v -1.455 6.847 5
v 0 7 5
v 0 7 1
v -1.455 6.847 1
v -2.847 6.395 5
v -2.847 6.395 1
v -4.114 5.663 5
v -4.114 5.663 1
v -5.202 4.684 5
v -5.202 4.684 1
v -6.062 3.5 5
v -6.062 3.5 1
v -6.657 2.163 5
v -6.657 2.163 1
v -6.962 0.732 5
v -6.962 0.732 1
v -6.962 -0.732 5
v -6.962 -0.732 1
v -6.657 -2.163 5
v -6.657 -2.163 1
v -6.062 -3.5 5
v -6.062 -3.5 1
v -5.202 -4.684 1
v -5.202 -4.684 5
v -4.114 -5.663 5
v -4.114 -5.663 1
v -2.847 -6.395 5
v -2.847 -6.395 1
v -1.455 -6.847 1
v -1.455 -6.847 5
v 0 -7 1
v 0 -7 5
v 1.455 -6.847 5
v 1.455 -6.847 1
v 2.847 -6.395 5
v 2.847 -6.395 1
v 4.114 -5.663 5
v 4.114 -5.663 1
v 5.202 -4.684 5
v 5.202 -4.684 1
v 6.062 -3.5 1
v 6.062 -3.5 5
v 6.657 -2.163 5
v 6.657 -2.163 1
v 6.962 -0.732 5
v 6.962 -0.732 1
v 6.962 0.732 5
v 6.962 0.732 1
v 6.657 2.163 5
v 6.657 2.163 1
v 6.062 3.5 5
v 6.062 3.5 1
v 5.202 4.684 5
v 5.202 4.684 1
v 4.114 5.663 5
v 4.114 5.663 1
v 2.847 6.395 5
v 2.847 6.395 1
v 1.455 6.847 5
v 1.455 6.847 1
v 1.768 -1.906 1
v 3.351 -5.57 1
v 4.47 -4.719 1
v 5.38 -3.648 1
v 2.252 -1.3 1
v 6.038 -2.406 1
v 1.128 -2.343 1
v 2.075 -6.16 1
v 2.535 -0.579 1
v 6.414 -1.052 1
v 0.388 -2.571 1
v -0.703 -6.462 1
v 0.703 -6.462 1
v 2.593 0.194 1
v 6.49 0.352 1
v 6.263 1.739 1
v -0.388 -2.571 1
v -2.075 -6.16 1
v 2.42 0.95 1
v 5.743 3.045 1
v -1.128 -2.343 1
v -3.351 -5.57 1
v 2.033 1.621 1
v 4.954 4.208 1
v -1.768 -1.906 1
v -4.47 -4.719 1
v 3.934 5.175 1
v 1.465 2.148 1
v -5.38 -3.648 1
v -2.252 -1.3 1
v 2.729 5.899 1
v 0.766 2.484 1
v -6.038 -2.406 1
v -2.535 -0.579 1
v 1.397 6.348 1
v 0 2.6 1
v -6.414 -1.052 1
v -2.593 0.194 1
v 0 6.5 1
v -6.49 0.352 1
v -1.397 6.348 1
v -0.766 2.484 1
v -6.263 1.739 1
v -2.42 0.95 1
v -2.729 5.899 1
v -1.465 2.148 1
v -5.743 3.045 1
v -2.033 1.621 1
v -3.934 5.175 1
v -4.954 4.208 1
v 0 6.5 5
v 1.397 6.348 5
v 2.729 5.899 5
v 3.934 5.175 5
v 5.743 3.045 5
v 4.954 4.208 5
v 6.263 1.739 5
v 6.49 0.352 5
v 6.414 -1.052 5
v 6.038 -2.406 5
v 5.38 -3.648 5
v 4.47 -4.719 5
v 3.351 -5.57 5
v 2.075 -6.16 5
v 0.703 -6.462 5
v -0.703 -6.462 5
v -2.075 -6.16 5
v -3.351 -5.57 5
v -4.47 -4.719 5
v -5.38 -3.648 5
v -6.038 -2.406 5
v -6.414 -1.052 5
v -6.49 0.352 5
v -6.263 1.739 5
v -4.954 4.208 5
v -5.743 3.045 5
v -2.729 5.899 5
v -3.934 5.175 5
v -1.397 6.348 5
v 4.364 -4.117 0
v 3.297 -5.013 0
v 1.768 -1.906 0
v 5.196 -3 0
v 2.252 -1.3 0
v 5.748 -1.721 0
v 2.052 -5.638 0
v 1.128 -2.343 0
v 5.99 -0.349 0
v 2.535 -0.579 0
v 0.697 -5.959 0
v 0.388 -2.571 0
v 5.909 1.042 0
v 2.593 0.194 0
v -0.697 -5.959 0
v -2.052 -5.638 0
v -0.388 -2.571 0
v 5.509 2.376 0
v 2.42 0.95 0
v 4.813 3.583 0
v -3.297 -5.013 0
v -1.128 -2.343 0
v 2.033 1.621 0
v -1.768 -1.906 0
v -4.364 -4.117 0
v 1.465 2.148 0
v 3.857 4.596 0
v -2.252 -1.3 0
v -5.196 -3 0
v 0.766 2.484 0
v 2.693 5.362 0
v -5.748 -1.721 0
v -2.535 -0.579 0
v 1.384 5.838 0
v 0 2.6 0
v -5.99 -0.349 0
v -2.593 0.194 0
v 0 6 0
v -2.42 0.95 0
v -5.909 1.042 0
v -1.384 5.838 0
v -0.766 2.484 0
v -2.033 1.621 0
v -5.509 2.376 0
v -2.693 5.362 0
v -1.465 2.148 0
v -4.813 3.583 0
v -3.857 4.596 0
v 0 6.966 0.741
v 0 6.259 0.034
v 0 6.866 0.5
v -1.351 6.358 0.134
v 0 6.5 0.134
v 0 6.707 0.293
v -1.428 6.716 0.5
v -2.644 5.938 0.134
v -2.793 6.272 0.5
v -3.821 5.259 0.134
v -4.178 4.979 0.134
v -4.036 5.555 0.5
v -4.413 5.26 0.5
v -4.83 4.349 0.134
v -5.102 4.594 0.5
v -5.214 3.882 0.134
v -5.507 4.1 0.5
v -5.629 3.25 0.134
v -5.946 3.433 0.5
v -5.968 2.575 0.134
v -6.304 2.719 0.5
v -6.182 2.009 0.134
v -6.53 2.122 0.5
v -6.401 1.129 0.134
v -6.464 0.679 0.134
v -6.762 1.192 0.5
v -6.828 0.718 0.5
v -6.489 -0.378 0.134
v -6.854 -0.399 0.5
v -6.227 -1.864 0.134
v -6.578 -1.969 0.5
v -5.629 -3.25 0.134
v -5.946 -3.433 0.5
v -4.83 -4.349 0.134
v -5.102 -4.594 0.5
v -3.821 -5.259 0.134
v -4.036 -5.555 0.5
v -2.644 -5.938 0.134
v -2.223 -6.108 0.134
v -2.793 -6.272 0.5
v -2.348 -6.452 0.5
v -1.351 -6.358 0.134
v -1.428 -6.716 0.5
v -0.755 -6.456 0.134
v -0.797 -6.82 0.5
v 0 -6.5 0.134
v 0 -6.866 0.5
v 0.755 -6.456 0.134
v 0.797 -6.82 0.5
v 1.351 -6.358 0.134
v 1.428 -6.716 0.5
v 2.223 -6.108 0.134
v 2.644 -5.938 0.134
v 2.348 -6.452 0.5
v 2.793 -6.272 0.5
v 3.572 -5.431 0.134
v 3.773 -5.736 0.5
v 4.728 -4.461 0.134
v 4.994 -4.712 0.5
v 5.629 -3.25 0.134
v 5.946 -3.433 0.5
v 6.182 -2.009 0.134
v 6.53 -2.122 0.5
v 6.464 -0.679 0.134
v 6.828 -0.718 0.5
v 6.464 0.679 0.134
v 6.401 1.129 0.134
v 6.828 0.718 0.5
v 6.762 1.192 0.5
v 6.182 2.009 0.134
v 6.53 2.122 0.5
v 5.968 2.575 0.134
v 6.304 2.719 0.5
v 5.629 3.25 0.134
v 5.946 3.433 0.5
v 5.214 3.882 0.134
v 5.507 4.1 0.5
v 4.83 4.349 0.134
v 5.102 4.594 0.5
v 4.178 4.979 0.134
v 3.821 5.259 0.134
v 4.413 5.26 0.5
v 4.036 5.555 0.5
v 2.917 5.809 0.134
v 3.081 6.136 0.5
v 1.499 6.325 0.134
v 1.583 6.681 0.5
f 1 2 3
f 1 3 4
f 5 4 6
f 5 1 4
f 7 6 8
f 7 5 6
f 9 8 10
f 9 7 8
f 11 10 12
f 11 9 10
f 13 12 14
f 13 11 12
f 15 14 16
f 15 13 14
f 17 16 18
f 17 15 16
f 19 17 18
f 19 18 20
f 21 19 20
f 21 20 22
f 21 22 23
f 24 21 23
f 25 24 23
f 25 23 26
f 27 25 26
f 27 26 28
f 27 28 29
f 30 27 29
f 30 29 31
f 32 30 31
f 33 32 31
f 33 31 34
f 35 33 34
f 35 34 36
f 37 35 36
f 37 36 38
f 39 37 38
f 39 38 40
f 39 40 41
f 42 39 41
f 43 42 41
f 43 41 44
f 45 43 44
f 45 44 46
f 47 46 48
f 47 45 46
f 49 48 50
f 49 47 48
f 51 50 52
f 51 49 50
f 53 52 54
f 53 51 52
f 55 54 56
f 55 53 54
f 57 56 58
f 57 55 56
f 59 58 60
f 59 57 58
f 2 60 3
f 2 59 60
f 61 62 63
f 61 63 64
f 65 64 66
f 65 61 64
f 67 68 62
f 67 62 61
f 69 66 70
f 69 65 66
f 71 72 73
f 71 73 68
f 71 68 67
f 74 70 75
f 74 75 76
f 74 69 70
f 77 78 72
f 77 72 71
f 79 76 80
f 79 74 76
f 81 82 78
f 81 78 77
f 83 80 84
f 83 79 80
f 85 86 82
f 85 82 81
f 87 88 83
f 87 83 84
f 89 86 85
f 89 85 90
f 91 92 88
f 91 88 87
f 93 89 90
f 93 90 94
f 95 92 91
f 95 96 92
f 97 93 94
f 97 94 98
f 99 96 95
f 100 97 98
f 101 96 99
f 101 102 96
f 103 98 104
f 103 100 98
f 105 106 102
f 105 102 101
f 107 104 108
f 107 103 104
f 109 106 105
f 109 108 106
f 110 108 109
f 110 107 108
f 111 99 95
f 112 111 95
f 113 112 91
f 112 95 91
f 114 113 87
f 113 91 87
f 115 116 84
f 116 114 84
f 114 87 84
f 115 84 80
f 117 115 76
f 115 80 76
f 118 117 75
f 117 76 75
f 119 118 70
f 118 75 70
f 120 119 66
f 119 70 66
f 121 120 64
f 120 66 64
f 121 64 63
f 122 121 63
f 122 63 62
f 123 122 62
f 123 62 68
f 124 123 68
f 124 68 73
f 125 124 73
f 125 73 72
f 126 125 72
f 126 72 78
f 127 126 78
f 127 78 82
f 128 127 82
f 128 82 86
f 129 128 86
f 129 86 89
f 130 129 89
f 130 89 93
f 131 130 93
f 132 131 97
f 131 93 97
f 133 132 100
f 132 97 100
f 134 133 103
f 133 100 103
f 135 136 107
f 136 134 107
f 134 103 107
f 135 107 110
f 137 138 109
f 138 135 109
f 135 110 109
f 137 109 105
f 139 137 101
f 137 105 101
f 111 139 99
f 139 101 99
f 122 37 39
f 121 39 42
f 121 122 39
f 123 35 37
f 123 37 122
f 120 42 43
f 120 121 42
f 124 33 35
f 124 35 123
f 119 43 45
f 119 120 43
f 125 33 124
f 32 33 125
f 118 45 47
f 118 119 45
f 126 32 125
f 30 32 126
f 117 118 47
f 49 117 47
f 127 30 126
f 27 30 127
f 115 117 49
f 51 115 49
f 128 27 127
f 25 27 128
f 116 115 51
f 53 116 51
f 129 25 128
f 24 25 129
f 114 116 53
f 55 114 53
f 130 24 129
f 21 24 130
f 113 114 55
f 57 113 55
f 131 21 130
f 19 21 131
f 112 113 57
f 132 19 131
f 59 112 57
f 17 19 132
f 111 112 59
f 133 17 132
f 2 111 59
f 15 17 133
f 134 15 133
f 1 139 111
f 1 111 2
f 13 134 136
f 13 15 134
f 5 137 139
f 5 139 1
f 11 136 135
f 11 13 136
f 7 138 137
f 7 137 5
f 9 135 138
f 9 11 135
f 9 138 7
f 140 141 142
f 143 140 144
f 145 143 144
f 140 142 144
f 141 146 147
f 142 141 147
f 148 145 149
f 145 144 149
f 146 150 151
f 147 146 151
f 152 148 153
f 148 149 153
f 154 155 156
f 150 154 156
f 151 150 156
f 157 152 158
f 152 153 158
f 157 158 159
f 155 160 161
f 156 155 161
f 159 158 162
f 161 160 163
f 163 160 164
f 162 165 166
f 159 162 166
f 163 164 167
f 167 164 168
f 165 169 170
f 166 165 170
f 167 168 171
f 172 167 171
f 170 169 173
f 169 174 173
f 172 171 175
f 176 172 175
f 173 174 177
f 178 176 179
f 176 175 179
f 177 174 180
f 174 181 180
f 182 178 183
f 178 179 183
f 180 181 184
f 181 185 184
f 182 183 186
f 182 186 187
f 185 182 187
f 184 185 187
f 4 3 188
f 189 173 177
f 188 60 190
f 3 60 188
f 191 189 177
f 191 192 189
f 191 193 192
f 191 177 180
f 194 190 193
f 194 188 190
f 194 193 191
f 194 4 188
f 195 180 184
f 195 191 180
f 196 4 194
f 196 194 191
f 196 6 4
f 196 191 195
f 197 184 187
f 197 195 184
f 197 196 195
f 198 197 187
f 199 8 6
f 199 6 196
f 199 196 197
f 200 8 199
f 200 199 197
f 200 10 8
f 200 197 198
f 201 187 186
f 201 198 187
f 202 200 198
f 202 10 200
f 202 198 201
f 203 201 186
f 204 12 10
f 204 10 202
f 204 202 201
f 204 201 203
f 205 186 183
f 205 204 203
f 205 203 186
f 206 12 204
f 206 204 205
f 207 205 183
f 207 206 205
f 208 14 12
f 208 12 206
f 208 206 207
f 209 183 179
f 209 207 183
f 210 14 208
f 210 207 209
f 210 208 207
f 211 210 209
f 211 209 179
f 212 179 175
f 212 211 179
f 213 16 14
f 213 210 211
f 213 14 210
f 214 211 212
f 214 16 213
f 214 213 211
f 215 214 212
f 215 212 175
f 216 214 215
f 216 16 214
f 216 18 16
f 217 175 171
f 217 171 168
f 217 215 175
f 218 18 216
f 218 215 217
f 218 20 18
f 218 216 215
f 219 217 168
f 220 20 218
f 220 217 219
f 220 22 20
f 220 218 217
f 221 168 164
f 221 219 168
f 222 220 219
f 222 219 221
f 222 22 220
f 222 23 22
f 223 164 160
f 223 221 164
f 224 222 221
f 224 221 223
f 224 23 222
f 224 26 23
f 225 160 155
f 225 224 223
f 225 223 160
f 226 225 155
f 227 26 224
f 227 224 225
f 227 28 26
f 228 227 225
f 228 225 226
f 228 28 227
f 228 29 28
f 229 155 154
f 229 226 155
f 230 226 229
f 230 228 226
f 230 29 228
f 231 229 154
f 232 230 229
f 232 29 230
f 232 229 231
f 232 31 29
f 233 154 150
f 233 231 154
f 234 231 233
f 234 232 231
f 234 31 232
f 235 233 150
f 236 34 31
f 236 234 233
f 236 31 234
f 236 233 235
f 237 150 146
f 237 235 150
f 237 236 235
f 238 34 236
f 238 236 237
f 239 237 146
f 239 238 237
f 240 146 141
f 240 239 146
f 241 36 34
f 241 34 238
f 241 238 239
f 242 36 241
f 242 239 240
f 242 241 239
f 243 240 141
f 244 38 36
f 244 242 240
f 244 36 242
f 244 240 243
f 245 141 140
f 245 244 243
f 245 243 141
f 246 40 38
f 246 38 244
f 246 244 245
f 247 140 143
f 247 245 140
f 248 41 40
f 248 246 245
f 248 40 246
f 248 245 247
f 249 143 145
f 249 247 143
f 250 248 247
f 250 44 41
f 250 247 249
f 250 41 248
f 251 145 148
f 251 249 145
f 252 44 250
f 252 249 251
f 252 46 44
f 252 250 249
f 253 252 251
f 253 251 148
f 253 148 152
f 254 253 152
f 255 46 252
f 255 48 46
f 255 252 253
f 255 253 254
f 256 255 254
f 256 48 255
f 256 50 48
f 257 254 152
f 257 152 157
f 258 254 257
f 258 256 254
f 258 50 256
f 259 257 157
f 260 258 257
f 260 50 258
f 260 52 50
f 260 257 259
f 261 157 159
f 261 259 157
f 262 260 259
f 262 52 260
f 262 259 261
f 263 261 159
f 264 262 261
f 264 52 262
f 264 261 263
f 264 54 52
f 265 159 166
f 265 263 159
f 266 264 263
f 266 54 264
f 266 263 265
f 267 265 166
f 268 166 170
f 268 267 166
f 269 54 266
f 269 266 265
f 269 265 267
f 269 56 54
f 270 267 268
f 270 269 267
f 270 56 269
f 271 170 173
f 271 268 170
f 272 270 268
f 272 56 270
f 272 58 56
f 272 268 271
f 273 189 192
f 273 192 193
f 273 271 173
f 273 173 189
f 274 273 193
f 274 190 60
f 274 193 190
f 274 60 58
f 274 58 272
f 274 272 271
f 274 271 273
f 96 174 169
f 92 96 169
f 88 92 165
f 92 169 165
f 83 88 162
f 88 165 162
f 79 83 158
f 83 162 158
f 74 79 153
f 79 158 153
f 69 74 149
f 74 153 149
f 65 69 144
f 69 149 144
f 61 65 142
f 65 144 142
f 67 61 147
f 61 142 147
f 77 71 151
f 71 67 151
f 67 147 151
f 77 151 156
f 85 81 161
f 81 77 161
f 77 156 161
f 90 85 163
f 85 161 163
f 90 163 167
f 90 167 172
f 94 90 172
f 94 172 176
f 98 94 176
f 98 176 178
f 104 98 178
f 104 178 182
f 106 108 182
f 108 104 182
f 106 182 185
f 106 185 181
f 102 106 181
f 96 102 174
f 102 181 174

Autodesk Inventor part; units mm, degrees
ref_plane "YZ Plane" through (0, 0, 0) normal (1, 0, 0) x (0, 1, 0)
ref_plane "XZ Plane" through (0, 0, 0) normal (0, 1, 0) x (-1, 0, 0)
ref_plane "XY Plane" through (0, 0, 0) normal (0, 0, 1) x (1, 0, 0)
sketch "Sketch3" plane through (0, 0, 0) normal (1, 0, 0) x (0, 1, 0)
  line L0 (0, 0) -> (0, 24.2821)
  line L1 (7, 0) -> (7, 5)
  line L2 (7, 5) -> (6.5, 5)
  line L3 (6.5, 5) -> (6.5, 1)
  line L4 (6.5, 1) -> (2.6, 1)
  line L5 (2.6, 1) -> (2.6, 0)
  line L6 (7, 0) -> (2.6, 0)
  dimension "d7" = 5.2
  dimension "d10" = 1
  dimension "d12" = 5
  dimension "d13" = 14
  dimension "d14" = 13
revolve "Revolution1" add sketch "Sketch3" angle 360 about axis through (0, 0, 0) along (0, 0, 1)
fillet "Fillet1" radius 1 1 edges at (0, -7, 0)
equation "\"d10\" = wall_thickness"
equation "\"wall_thickness\" = 1"
properties part number "Electrode Skirt Short" material "Stainless Steel"
